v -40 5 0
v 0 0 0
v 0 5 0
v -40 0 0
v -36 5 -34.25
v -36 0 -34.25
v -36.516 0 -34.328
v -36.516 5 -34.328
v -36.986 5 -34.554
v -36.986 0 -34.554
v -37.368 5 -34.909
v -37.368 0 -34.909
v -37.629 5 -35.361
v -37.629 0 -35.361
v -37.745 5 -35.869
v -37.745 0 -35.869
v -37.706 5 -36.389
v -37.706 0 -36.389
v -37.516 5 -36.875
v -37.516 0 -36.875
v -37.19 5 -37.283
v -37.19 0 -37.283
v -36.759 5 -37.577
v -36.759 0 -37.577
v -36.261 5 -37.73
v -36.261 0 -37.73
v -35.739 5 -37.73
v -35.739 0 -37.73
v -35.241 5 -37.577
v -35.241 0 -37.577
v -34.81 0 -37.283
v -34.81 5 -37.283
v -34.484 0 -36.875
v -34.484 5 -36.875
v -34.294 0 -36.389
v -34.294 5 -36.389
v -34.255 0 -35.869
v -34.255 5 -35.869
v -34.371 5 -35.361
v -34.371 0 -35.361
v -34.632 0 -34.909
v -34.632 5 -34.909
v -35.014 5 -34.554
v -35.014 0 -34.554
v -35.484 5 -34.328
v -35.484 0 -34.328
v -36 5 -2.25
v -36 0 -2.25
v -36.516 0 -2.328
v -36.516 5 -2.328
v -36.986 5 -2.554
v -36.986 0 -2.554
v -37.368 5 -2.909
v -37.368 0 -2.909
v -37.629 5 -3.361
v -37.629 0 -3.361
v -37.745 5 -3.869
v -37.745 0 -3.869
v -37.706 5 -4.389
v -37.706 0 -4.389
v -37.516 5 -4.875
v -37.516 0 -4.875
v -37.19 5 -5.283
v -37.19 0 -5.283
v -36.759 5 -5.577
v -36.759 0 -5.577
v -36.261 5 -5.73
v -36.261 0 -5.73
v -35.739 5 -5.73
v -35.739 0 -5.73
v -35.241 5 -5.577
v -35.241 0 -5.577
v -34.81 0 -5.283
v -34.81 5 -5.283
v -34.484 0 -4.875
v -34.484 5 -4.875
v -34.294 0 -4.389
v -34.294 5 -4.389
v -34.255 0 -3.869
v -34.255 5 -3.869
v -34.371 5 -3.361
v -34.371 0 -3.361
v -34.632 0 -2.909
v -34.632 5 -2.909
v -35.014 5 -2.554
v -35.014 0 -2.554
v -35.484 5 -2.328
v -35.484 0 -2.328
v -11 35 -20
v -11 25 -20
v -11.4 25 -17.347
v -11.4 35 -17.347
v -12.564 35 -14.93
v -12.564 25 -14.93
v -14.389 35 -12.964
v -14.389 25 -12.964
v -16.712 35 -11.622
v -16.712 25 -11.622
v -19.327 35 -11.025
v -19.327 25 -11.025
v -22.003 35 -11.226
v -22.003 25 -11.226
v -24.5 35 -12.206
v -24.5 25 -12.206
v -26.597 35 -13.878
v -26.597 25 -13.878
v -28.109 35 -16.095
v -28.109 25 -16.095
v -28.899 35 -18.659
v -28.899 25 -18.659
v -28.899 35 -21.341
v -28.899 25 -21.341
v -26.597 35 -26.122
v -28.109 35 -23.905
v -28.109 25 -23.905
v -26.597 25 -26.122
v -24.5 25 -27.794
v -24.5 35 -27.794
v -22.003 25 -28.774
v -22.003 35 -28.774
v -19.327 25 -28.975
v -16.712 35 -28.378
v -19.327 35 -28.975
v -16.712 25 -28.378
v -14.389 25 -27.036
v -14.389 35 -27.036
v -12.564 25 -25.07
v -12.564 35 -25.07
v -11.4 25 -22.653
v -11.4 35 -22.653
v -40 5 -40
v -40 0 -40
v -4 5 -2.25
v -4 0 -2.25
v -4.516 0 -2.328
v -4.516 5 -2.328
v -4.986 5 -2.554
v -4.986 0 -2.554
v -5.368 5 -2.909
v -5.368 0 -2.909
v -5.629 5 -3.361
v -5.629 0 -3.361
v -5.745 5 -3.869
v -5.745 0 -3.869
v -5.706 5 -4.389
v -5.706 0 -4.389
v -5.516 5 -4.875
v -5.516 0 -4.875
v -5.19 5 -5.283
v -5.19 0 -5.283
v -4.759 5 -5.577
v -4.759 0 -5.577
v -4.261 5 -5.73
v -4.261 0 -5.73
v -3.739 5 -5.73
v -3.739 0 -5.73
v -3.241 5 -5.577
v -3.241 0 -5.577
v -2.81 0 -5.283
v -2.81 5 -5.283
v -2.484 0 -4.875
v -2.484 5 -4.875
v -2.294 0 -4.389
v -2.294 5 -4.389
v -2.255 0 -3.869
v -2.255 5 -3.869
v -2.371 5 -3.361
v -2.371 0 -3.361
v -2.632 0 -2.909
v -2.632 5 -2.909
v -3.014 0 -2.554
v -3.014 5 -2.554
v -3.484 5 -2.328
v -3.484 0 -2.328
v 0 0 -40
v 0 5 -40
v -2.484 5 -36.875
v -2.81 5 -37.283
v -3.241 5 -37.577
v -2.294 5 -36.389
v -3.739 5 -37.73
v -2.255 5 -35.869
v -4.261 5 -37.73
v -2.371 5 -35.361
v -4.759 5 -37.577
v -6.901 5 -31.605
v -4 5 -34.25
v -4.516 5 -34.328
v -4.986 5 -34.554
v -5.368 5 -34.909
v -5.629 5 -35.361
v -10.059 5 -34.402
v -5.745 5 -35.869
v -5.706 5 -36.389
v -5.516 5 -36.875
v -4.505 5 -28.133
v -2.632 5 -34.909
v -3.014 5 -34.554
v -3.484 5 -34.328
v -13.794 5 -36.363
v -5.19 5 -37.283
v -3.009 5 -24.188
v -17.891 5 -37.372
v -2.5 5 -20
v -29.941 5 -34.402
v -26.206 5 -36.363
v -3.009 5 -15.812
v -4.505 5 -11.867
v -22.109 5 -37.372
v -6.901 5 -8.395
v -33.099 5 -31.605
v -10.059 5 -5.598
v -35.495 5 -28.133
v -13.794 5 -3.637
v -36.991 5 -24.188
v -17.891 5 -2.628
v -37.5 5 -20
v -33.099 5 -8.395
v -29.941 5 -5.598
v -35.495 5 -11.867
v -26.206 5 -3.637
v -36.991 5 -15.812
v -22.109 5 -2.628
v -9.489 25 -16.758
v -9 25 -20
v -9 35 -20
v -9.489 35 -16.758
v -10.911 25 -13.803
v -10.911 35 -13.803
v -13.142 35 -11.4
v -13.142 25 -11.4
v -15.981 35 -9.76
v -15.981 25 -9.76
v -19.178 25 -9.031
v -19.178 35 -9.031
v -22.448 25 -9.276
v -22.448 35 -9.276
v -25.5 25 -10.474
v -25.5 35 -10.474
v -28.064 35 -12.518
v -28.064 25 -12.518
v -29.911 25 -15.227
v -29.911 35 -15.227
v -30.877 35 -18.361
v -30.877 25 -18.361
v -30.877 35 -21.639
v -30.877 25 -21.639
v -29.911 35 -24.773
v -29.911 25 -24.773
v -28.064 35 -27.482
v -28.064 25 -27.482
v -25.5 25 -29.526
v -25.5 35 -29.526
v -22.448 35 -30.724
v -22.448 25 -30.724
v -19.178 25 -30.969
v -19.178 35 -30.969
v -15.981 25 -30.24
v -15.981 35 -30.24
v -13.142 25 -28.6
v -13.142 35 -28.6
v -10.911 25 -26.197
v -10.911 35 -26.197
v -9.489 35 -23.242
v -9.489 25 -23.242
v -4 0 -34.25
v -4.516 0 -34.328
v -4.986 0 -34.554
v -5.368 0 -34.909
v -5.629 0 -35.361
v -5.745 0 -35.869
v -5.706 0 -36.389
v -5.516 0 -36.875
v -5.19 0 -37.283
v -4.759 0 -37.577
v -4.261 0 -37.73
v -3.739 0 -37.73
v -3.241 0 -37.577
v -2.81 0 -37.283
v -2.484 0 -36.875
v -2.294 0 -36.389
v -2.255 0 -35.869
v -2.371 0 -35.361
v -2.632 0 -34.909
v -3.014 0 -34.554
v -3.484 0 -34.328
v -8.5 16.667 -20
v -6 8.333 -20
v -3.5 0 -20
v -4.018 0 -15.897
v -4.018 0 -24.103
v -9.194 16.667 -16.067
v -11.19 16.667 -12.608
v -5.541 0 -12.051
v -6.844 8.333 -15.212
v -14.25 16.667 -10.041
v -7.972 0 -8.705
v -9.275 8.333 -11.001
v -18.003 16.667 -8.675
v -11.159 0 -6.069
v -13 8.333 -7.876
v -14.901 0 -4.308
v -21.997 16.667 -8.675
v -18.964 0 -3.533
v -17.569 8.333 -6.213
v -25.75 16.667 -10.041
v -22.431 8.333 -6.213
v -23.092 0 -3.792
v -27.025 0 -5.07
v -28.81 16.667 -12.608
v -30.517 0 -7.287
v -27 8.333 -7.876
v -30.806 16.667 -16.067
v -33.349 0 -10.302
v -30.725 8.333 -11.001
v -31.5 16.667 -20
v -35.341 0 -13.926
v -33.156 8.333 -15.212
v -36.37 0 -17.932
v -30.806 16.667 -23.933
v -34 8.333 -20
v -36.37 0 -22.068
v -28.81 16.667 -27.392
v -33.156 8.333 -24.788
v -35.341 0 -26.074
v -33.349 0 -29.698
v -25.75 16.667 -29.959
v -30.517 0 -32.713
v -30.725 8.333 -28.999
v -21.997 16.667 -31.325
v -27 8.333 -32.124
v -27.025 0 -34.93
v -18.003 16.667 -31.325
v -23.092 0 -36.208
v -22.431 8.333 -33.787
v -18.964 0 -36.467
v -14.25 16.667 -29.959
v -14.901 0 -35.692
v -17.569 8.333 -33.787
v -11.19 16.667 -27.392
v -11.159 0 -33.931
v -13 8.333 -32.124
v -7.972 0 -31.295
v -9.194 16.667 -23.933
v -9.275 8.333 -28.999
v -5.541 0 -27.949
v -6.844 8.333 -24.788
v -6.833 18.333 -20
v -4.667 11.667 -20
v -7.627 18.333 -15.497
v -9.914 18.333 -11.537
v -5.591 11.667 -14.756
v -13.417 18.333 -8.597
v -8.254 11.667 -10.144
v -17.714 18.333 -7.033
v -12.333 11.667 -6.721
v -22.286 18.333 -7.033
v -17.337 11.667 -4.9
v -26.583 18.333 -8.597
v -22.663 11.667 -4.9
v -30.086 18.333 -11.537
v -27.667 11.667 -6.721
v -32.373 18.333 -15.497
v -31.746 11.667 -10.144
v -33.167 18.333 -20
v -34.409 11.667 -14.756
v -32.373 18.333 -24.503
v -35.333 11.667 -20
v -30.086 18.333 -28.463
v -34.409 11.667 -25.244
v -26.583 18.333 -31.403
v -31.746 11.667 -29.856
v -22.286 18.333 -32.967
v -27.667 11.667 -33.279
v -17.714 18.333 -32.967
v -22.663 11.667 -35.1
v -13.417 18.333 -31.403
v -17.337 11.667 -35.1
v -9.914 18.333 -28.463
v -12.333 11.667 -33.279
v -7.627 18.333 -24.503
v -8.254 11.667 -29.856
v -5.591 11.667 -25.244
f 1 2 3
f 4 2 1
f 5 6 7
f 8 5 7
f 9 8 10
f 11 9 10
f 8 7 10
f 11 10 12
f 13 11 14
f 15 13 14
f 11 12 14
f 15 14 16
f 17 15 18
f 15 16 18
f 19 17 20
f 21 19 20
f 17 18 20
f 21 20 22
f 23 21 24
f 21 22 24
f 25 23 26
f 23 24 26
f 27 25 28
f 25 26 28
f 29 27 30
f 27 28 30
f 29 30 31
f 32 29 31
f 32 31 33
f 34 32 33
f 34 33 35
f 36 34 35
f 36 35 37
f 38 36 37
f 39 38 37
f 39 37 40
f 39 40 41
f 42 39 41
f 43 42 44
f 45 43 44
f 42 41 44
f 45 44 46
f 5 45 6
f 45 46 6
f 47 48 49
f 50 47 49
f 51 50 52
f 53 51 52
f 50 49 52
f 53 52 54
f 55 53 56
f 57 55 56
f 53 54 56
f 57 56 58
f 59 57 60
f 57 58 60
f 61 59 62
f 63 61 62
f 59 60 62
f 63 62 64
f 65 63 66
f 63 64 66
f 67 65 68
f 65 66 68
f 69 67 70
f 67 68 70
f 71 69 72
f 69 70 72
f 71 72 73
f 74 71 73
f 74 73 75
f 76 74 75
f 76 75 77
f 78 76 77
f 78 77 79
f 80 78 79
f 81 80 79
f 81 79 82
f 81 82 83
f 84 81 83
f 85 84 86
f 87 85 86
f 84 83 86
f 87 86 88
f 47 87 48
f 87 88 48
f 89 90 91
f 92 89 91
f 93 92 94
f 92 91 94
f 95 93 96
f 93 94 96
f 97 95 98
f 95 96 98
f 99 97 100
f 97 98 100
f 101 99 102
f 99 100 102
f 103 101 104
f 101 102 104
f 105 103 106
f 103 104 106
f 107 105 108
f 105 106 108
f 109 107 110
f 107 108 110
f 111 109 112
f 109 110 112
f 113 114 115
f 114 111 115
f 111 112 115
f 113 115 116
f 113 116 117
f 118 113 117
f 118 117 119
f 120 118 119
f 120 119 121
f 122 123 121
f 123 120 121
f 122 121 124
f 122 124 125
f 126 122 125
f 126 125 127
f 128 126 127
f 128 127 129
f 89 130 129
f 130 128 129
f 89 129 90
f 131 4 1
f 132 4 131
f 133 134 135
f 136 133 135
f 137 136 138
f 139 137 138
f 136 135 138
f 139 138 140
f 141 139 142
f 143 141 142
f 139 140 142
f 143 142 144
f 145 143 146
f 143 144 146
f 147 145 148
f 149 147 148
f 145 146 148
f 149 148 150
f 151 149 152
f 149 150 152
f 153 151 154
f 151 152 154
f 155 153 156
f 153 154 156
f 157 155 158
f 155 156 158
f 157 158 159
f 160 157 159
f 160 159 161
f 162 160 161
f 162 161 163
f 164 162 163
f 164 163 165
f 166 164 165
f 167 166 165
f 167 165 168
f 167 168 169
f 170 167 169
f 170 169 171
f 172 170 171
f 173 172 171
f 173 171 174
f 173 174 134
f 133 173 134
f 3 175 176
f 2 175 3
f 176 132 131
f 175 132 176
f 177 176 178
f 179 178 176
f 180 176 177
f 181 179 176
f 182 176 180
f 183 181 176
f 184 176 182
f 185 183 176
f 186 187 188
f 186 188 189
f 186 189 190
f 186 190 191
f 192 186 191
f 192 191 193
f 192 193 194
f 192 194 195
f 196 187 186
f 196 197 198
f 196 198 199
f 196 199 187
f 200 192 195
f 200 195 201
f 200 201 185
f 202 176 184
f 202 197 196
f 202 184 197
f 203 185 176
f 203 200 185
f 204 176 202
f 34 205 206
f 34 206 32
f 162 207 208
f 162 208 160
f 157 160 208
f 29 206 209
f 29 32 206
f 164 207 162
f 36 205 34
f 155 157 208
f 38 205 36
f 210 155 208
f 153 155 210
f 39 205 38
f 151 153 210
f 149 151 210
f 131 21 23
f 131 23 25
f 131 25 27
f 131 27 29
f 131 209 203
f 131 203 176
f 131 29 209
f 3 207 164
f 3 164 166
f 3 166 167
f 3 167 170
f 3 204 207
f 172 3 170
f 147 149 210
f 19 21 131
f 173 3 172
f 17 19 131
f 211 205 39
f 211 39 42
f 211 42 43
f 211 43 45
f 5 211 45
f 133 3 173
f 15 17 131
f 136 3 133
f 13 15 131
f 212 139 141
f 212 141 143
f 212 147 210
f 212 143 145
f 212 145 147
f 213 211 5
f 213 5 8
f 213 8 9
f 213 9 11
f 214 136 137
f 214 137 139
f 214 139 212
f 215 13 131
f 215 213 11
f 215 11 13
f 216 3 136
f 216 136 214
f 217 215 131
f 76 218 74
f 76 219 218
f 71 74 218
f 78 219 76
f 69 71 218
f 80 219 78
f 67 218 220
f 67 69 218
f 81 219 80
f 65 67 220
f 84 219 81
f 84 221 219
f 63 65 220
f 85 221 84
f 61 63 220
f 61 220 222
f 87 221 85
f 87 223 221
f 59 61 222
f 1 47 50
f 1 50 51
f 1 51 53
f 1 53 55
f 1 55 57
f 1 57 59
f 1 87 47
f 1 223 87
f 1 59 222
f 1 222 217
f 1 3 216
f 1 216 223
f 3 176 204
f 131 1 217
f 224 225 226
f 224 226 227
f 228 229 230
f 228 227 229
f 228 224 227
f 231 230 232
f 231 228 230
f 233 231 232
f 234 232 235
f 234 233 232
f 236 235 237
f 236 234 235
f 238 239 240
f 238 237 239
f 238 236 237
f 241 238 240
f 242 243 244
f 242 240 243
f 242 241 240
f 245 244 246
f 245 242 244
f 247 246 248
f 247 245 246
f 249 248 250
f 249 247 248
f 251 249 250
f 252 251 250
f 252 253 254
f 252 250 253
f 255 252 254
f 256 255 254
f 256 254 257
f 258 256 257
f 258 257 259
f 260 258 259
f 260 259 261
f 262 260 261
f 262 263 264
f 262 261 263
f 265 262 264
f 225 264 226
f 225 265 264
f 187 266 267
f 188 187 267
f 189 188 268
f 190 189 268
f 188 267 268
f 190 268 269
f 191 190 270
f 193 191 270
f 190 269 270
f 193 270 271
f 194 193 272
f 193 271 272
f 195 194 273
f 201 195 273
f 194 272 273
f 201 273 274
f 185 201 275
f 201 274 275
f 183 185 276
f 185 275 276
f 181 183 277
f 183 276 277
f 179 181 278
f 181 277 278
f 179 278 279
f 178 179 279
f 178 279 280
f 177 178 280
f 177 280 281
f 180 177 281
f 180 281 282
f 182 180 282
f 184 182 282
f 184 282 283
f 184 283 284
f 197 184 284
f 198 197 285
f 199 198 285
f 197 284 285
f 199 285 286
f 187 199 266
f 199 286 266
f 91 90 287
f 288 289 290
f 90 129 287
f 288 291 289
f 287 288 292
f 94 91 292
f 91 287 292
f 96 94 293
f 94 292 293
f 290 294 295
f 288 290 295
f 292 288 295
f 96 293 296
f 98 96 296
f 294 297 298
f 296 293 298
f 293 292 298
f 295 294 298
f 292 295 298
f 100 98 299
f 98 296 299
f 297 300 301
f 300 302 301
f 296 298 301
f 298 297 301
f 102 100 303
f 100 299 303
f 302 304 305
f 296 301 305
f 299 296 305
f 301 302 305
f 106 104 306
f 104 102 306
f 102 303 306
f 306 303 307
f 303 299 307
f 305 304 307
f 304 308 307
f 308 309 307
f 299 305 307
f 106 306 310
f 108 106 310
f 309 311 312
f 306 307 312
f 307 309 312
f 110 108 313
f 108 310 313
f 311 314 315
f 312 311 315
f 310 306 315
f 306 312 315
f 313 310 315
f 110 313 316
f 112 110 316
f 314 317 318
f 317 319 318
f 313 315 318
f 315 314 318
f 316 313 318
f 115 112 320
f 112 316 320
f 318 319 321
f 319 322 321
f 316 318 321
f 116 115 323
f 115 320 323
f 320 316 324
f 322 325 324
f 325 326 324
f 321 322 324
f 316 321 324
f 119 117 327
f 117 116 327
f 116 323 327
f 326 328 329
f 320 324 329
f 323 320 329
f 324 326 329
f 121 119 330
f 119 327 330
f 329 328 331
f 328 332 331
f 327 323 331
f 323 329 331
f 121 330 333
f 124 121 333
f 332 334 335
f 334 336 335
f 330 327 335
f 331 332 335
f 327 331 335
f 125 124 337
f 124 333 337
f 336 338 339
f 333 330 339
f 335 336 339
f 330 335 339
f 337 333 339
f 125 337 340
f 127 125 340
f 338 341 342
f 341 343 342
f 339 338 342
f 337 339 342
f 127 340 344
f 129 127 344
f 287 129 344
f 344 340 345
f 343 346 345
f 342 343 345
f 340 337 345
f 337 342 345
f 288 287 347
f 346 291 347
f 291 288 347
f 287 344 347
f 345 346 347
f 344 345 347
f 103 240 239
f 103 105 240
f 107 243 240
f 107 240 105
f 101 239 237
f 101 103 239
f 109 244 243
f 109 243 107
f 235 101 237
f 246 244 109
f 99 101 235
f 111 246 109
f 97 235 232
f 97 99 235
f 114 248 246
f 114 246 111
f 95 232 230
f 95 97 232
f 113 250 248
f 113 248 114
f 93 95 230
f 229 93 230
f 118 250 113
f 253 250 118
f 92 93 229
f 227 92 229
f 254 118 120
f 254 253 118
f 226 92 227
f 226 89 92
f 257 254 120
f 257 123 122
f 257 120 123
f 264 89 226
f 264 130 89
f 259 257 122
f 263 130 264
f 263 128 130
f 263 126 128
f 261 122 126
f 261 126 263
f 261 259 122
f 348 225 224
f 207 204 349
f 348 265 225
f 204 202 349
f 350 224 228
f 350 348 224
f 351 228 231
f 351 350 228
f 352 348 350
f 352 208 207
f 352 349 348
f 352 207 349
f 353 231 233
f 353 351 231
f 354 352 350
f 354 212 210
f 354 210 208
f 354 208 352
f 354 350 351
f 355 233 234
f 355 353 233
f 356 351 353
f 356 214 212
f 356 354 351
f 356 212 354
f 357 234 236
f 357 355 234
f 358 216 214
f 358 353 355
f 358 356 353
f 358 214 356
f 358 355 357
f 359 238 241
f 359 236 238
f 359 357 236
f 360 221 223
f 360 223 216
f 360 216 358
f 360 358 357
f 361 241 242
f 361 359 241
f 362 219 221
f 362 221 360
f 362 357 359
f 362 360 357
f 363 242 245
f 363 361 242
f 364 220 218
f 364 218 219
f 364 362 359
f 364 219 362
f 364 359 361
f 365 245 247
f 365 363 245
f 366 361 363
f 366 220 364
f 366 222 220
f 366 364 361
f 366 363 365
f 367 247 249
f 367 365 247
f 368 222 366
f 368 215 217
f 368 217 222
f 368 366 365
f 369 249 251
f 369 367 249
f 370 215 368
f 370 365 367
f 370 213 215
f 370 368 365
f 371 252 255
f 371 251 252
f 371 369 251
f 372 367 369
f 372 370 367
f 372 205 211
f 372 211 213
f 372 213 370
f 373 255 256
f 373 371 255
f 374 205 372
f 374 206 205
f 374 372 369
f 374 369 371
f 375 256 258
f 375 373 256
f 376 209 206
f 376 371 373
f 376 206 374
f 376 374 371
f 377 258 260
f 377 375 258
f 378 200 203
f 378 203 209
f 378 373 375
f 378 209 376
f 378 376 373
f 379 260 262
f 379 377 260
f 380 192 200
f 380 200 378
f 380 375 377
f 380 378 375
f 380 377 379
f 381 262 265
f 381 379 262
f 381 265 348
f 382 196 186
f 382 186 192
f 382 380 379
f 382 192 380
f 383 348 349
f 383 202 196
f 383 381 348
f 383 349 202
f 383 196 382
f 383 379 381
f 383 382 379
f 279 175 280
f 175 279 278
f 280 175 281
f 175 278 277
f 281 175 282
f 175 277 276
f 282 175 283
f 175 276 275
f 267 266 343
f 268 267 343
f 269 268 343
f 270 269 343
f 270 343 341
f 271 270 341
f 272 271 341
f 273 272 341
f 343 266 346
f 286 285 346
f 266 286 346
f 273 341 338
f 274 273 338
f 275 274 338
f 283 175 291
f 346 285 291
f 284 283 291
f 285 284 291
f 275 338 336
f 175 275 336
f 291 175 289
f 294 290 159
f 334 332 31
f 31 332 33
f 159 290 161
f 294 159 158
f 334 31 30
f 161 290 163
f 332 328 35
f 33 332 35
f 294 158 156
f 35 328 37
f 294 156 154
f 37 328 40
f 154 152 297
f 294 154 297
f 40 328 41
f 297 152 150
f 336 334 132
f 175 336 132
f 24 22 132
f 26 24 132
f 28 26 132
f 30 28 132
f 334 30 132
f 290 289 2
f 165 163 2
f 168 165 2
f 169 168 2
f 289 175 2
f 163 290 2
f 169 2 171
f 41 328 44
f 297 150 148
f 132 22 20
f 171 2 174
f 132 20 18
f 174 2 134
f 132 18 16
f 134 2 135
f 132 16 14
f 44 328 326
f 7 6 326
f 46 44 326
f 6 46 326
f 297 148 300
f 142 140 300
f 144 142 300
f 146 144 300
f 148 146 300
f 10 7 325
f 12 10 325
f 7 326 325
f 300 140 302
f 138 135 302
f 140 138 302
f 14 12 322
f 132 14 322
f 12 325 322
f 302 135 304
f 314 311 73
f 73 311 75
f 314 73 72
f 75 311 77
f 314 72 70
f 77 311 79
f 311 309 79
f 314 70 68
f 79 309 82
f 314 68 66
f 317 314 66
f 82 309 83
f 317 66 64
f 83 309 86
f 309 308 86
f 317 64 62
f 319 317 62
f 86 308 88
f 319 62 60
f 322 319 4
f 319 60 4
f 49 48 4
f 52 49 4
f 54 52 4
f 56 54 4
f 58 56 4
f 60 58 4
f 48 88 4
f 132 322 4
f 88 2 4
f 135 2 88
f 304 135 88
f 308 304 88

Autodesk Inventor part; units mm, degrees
ref_plane "YZ Plane" through (0, 0, 0) normal (1, 0, 0) x (0, 1, 0)
ref_plane "XZ Plane" through (0, 0, 0) normal (0, 1, 0) x (-1, 0, 0)
ref_plane "XY Plane" through (0, 0, 0) normal (0, 0, 1) x (1, 0, 0)
sketch "Sketch1" plane through (0, 0, 0) normal (0, 1, 0) x (-1, 0, 0)
  line L0 (0, 0) -> (40, 0)
  line L1 (40, 0) -> (40, -40)
  line L2 (40, -40) -> (0, -40)
  line L3 (0, -40) -> (0, 0)
  dimension "d0" = 40
  dimension "d1" = 40
extrude "Extrusion1" add sketch "Sketch1" along normal blind 5
sketch "Sketch2" plane through (0, 5, 0) normal (0, 1, 0) x (1, 0, 0)
  circle A0 centre (-20, 20) radius 17.5
  point P0 (0, 0)
  dimension "d4" = 35
ref_plane "Work Plane1" through (0, 25, 0) normal (0, 1, 0) x (1, 0, 0)
sketch "Sketch3" plane through (0, 25, 0) normal (0, 1, 0) x (1, 0, 0)
  circle A0 centre (-20, 20) radius 11
  point P0 (0, 0)
  dimension "d6" = 22
loft "Loft1" add profiles "Sketch2", "Sketch3"
sketch "Sketch6" plane through (0, 25, 0) normal (0, 1, 0) x (1, 0, 0)
  circle A0 centre (-20, 20) radius 9
  circle A1 centre (-20, 20) radius 11 projected
  point P0 (0, 0)
  dimension "d15" = 18
sketch "Sketch8" plane through (0, 0, 0) normal (0, -1, 0) x (1, 0, 0)
  circle A0 centre (-20, -20) radius 16.5
  point P0 (0, 0)
  dimension "d16" = 33
loft "Loft2" cut profiles "Sketch8", "Sketch6" contours all / A0
sketch "Sketch9" plane through (0, 25, 0) normal (0, 1, 0) x (1, 0, 0)
  circle A0 centre (-20, 20) radius 11
  circle A1 centre (-20, 20) radius 9
  point P0 (0, 0)
  dimension "d21" = 22
  dimension "d22" = 18
extrude "Extrusion3" add sketch "Sketch9" along normal blind 10
hole "Hole1" at (-36, 5, -4) direction (0, -1, 0) diameter 3.5 end through all
hole "Hole2" at (-4, 5, -4) direction (0, -1, 0) diameter 3.5 end through all
hole "Hole3" at (-4, 5, -36) direction (0, -1, 0) diameter 3.5 end through all
hole "Hole4" at (-36, 5, -36) direction (0, -1, 0) diameter 3.5 end through all
properties part number "FanAdapter"
